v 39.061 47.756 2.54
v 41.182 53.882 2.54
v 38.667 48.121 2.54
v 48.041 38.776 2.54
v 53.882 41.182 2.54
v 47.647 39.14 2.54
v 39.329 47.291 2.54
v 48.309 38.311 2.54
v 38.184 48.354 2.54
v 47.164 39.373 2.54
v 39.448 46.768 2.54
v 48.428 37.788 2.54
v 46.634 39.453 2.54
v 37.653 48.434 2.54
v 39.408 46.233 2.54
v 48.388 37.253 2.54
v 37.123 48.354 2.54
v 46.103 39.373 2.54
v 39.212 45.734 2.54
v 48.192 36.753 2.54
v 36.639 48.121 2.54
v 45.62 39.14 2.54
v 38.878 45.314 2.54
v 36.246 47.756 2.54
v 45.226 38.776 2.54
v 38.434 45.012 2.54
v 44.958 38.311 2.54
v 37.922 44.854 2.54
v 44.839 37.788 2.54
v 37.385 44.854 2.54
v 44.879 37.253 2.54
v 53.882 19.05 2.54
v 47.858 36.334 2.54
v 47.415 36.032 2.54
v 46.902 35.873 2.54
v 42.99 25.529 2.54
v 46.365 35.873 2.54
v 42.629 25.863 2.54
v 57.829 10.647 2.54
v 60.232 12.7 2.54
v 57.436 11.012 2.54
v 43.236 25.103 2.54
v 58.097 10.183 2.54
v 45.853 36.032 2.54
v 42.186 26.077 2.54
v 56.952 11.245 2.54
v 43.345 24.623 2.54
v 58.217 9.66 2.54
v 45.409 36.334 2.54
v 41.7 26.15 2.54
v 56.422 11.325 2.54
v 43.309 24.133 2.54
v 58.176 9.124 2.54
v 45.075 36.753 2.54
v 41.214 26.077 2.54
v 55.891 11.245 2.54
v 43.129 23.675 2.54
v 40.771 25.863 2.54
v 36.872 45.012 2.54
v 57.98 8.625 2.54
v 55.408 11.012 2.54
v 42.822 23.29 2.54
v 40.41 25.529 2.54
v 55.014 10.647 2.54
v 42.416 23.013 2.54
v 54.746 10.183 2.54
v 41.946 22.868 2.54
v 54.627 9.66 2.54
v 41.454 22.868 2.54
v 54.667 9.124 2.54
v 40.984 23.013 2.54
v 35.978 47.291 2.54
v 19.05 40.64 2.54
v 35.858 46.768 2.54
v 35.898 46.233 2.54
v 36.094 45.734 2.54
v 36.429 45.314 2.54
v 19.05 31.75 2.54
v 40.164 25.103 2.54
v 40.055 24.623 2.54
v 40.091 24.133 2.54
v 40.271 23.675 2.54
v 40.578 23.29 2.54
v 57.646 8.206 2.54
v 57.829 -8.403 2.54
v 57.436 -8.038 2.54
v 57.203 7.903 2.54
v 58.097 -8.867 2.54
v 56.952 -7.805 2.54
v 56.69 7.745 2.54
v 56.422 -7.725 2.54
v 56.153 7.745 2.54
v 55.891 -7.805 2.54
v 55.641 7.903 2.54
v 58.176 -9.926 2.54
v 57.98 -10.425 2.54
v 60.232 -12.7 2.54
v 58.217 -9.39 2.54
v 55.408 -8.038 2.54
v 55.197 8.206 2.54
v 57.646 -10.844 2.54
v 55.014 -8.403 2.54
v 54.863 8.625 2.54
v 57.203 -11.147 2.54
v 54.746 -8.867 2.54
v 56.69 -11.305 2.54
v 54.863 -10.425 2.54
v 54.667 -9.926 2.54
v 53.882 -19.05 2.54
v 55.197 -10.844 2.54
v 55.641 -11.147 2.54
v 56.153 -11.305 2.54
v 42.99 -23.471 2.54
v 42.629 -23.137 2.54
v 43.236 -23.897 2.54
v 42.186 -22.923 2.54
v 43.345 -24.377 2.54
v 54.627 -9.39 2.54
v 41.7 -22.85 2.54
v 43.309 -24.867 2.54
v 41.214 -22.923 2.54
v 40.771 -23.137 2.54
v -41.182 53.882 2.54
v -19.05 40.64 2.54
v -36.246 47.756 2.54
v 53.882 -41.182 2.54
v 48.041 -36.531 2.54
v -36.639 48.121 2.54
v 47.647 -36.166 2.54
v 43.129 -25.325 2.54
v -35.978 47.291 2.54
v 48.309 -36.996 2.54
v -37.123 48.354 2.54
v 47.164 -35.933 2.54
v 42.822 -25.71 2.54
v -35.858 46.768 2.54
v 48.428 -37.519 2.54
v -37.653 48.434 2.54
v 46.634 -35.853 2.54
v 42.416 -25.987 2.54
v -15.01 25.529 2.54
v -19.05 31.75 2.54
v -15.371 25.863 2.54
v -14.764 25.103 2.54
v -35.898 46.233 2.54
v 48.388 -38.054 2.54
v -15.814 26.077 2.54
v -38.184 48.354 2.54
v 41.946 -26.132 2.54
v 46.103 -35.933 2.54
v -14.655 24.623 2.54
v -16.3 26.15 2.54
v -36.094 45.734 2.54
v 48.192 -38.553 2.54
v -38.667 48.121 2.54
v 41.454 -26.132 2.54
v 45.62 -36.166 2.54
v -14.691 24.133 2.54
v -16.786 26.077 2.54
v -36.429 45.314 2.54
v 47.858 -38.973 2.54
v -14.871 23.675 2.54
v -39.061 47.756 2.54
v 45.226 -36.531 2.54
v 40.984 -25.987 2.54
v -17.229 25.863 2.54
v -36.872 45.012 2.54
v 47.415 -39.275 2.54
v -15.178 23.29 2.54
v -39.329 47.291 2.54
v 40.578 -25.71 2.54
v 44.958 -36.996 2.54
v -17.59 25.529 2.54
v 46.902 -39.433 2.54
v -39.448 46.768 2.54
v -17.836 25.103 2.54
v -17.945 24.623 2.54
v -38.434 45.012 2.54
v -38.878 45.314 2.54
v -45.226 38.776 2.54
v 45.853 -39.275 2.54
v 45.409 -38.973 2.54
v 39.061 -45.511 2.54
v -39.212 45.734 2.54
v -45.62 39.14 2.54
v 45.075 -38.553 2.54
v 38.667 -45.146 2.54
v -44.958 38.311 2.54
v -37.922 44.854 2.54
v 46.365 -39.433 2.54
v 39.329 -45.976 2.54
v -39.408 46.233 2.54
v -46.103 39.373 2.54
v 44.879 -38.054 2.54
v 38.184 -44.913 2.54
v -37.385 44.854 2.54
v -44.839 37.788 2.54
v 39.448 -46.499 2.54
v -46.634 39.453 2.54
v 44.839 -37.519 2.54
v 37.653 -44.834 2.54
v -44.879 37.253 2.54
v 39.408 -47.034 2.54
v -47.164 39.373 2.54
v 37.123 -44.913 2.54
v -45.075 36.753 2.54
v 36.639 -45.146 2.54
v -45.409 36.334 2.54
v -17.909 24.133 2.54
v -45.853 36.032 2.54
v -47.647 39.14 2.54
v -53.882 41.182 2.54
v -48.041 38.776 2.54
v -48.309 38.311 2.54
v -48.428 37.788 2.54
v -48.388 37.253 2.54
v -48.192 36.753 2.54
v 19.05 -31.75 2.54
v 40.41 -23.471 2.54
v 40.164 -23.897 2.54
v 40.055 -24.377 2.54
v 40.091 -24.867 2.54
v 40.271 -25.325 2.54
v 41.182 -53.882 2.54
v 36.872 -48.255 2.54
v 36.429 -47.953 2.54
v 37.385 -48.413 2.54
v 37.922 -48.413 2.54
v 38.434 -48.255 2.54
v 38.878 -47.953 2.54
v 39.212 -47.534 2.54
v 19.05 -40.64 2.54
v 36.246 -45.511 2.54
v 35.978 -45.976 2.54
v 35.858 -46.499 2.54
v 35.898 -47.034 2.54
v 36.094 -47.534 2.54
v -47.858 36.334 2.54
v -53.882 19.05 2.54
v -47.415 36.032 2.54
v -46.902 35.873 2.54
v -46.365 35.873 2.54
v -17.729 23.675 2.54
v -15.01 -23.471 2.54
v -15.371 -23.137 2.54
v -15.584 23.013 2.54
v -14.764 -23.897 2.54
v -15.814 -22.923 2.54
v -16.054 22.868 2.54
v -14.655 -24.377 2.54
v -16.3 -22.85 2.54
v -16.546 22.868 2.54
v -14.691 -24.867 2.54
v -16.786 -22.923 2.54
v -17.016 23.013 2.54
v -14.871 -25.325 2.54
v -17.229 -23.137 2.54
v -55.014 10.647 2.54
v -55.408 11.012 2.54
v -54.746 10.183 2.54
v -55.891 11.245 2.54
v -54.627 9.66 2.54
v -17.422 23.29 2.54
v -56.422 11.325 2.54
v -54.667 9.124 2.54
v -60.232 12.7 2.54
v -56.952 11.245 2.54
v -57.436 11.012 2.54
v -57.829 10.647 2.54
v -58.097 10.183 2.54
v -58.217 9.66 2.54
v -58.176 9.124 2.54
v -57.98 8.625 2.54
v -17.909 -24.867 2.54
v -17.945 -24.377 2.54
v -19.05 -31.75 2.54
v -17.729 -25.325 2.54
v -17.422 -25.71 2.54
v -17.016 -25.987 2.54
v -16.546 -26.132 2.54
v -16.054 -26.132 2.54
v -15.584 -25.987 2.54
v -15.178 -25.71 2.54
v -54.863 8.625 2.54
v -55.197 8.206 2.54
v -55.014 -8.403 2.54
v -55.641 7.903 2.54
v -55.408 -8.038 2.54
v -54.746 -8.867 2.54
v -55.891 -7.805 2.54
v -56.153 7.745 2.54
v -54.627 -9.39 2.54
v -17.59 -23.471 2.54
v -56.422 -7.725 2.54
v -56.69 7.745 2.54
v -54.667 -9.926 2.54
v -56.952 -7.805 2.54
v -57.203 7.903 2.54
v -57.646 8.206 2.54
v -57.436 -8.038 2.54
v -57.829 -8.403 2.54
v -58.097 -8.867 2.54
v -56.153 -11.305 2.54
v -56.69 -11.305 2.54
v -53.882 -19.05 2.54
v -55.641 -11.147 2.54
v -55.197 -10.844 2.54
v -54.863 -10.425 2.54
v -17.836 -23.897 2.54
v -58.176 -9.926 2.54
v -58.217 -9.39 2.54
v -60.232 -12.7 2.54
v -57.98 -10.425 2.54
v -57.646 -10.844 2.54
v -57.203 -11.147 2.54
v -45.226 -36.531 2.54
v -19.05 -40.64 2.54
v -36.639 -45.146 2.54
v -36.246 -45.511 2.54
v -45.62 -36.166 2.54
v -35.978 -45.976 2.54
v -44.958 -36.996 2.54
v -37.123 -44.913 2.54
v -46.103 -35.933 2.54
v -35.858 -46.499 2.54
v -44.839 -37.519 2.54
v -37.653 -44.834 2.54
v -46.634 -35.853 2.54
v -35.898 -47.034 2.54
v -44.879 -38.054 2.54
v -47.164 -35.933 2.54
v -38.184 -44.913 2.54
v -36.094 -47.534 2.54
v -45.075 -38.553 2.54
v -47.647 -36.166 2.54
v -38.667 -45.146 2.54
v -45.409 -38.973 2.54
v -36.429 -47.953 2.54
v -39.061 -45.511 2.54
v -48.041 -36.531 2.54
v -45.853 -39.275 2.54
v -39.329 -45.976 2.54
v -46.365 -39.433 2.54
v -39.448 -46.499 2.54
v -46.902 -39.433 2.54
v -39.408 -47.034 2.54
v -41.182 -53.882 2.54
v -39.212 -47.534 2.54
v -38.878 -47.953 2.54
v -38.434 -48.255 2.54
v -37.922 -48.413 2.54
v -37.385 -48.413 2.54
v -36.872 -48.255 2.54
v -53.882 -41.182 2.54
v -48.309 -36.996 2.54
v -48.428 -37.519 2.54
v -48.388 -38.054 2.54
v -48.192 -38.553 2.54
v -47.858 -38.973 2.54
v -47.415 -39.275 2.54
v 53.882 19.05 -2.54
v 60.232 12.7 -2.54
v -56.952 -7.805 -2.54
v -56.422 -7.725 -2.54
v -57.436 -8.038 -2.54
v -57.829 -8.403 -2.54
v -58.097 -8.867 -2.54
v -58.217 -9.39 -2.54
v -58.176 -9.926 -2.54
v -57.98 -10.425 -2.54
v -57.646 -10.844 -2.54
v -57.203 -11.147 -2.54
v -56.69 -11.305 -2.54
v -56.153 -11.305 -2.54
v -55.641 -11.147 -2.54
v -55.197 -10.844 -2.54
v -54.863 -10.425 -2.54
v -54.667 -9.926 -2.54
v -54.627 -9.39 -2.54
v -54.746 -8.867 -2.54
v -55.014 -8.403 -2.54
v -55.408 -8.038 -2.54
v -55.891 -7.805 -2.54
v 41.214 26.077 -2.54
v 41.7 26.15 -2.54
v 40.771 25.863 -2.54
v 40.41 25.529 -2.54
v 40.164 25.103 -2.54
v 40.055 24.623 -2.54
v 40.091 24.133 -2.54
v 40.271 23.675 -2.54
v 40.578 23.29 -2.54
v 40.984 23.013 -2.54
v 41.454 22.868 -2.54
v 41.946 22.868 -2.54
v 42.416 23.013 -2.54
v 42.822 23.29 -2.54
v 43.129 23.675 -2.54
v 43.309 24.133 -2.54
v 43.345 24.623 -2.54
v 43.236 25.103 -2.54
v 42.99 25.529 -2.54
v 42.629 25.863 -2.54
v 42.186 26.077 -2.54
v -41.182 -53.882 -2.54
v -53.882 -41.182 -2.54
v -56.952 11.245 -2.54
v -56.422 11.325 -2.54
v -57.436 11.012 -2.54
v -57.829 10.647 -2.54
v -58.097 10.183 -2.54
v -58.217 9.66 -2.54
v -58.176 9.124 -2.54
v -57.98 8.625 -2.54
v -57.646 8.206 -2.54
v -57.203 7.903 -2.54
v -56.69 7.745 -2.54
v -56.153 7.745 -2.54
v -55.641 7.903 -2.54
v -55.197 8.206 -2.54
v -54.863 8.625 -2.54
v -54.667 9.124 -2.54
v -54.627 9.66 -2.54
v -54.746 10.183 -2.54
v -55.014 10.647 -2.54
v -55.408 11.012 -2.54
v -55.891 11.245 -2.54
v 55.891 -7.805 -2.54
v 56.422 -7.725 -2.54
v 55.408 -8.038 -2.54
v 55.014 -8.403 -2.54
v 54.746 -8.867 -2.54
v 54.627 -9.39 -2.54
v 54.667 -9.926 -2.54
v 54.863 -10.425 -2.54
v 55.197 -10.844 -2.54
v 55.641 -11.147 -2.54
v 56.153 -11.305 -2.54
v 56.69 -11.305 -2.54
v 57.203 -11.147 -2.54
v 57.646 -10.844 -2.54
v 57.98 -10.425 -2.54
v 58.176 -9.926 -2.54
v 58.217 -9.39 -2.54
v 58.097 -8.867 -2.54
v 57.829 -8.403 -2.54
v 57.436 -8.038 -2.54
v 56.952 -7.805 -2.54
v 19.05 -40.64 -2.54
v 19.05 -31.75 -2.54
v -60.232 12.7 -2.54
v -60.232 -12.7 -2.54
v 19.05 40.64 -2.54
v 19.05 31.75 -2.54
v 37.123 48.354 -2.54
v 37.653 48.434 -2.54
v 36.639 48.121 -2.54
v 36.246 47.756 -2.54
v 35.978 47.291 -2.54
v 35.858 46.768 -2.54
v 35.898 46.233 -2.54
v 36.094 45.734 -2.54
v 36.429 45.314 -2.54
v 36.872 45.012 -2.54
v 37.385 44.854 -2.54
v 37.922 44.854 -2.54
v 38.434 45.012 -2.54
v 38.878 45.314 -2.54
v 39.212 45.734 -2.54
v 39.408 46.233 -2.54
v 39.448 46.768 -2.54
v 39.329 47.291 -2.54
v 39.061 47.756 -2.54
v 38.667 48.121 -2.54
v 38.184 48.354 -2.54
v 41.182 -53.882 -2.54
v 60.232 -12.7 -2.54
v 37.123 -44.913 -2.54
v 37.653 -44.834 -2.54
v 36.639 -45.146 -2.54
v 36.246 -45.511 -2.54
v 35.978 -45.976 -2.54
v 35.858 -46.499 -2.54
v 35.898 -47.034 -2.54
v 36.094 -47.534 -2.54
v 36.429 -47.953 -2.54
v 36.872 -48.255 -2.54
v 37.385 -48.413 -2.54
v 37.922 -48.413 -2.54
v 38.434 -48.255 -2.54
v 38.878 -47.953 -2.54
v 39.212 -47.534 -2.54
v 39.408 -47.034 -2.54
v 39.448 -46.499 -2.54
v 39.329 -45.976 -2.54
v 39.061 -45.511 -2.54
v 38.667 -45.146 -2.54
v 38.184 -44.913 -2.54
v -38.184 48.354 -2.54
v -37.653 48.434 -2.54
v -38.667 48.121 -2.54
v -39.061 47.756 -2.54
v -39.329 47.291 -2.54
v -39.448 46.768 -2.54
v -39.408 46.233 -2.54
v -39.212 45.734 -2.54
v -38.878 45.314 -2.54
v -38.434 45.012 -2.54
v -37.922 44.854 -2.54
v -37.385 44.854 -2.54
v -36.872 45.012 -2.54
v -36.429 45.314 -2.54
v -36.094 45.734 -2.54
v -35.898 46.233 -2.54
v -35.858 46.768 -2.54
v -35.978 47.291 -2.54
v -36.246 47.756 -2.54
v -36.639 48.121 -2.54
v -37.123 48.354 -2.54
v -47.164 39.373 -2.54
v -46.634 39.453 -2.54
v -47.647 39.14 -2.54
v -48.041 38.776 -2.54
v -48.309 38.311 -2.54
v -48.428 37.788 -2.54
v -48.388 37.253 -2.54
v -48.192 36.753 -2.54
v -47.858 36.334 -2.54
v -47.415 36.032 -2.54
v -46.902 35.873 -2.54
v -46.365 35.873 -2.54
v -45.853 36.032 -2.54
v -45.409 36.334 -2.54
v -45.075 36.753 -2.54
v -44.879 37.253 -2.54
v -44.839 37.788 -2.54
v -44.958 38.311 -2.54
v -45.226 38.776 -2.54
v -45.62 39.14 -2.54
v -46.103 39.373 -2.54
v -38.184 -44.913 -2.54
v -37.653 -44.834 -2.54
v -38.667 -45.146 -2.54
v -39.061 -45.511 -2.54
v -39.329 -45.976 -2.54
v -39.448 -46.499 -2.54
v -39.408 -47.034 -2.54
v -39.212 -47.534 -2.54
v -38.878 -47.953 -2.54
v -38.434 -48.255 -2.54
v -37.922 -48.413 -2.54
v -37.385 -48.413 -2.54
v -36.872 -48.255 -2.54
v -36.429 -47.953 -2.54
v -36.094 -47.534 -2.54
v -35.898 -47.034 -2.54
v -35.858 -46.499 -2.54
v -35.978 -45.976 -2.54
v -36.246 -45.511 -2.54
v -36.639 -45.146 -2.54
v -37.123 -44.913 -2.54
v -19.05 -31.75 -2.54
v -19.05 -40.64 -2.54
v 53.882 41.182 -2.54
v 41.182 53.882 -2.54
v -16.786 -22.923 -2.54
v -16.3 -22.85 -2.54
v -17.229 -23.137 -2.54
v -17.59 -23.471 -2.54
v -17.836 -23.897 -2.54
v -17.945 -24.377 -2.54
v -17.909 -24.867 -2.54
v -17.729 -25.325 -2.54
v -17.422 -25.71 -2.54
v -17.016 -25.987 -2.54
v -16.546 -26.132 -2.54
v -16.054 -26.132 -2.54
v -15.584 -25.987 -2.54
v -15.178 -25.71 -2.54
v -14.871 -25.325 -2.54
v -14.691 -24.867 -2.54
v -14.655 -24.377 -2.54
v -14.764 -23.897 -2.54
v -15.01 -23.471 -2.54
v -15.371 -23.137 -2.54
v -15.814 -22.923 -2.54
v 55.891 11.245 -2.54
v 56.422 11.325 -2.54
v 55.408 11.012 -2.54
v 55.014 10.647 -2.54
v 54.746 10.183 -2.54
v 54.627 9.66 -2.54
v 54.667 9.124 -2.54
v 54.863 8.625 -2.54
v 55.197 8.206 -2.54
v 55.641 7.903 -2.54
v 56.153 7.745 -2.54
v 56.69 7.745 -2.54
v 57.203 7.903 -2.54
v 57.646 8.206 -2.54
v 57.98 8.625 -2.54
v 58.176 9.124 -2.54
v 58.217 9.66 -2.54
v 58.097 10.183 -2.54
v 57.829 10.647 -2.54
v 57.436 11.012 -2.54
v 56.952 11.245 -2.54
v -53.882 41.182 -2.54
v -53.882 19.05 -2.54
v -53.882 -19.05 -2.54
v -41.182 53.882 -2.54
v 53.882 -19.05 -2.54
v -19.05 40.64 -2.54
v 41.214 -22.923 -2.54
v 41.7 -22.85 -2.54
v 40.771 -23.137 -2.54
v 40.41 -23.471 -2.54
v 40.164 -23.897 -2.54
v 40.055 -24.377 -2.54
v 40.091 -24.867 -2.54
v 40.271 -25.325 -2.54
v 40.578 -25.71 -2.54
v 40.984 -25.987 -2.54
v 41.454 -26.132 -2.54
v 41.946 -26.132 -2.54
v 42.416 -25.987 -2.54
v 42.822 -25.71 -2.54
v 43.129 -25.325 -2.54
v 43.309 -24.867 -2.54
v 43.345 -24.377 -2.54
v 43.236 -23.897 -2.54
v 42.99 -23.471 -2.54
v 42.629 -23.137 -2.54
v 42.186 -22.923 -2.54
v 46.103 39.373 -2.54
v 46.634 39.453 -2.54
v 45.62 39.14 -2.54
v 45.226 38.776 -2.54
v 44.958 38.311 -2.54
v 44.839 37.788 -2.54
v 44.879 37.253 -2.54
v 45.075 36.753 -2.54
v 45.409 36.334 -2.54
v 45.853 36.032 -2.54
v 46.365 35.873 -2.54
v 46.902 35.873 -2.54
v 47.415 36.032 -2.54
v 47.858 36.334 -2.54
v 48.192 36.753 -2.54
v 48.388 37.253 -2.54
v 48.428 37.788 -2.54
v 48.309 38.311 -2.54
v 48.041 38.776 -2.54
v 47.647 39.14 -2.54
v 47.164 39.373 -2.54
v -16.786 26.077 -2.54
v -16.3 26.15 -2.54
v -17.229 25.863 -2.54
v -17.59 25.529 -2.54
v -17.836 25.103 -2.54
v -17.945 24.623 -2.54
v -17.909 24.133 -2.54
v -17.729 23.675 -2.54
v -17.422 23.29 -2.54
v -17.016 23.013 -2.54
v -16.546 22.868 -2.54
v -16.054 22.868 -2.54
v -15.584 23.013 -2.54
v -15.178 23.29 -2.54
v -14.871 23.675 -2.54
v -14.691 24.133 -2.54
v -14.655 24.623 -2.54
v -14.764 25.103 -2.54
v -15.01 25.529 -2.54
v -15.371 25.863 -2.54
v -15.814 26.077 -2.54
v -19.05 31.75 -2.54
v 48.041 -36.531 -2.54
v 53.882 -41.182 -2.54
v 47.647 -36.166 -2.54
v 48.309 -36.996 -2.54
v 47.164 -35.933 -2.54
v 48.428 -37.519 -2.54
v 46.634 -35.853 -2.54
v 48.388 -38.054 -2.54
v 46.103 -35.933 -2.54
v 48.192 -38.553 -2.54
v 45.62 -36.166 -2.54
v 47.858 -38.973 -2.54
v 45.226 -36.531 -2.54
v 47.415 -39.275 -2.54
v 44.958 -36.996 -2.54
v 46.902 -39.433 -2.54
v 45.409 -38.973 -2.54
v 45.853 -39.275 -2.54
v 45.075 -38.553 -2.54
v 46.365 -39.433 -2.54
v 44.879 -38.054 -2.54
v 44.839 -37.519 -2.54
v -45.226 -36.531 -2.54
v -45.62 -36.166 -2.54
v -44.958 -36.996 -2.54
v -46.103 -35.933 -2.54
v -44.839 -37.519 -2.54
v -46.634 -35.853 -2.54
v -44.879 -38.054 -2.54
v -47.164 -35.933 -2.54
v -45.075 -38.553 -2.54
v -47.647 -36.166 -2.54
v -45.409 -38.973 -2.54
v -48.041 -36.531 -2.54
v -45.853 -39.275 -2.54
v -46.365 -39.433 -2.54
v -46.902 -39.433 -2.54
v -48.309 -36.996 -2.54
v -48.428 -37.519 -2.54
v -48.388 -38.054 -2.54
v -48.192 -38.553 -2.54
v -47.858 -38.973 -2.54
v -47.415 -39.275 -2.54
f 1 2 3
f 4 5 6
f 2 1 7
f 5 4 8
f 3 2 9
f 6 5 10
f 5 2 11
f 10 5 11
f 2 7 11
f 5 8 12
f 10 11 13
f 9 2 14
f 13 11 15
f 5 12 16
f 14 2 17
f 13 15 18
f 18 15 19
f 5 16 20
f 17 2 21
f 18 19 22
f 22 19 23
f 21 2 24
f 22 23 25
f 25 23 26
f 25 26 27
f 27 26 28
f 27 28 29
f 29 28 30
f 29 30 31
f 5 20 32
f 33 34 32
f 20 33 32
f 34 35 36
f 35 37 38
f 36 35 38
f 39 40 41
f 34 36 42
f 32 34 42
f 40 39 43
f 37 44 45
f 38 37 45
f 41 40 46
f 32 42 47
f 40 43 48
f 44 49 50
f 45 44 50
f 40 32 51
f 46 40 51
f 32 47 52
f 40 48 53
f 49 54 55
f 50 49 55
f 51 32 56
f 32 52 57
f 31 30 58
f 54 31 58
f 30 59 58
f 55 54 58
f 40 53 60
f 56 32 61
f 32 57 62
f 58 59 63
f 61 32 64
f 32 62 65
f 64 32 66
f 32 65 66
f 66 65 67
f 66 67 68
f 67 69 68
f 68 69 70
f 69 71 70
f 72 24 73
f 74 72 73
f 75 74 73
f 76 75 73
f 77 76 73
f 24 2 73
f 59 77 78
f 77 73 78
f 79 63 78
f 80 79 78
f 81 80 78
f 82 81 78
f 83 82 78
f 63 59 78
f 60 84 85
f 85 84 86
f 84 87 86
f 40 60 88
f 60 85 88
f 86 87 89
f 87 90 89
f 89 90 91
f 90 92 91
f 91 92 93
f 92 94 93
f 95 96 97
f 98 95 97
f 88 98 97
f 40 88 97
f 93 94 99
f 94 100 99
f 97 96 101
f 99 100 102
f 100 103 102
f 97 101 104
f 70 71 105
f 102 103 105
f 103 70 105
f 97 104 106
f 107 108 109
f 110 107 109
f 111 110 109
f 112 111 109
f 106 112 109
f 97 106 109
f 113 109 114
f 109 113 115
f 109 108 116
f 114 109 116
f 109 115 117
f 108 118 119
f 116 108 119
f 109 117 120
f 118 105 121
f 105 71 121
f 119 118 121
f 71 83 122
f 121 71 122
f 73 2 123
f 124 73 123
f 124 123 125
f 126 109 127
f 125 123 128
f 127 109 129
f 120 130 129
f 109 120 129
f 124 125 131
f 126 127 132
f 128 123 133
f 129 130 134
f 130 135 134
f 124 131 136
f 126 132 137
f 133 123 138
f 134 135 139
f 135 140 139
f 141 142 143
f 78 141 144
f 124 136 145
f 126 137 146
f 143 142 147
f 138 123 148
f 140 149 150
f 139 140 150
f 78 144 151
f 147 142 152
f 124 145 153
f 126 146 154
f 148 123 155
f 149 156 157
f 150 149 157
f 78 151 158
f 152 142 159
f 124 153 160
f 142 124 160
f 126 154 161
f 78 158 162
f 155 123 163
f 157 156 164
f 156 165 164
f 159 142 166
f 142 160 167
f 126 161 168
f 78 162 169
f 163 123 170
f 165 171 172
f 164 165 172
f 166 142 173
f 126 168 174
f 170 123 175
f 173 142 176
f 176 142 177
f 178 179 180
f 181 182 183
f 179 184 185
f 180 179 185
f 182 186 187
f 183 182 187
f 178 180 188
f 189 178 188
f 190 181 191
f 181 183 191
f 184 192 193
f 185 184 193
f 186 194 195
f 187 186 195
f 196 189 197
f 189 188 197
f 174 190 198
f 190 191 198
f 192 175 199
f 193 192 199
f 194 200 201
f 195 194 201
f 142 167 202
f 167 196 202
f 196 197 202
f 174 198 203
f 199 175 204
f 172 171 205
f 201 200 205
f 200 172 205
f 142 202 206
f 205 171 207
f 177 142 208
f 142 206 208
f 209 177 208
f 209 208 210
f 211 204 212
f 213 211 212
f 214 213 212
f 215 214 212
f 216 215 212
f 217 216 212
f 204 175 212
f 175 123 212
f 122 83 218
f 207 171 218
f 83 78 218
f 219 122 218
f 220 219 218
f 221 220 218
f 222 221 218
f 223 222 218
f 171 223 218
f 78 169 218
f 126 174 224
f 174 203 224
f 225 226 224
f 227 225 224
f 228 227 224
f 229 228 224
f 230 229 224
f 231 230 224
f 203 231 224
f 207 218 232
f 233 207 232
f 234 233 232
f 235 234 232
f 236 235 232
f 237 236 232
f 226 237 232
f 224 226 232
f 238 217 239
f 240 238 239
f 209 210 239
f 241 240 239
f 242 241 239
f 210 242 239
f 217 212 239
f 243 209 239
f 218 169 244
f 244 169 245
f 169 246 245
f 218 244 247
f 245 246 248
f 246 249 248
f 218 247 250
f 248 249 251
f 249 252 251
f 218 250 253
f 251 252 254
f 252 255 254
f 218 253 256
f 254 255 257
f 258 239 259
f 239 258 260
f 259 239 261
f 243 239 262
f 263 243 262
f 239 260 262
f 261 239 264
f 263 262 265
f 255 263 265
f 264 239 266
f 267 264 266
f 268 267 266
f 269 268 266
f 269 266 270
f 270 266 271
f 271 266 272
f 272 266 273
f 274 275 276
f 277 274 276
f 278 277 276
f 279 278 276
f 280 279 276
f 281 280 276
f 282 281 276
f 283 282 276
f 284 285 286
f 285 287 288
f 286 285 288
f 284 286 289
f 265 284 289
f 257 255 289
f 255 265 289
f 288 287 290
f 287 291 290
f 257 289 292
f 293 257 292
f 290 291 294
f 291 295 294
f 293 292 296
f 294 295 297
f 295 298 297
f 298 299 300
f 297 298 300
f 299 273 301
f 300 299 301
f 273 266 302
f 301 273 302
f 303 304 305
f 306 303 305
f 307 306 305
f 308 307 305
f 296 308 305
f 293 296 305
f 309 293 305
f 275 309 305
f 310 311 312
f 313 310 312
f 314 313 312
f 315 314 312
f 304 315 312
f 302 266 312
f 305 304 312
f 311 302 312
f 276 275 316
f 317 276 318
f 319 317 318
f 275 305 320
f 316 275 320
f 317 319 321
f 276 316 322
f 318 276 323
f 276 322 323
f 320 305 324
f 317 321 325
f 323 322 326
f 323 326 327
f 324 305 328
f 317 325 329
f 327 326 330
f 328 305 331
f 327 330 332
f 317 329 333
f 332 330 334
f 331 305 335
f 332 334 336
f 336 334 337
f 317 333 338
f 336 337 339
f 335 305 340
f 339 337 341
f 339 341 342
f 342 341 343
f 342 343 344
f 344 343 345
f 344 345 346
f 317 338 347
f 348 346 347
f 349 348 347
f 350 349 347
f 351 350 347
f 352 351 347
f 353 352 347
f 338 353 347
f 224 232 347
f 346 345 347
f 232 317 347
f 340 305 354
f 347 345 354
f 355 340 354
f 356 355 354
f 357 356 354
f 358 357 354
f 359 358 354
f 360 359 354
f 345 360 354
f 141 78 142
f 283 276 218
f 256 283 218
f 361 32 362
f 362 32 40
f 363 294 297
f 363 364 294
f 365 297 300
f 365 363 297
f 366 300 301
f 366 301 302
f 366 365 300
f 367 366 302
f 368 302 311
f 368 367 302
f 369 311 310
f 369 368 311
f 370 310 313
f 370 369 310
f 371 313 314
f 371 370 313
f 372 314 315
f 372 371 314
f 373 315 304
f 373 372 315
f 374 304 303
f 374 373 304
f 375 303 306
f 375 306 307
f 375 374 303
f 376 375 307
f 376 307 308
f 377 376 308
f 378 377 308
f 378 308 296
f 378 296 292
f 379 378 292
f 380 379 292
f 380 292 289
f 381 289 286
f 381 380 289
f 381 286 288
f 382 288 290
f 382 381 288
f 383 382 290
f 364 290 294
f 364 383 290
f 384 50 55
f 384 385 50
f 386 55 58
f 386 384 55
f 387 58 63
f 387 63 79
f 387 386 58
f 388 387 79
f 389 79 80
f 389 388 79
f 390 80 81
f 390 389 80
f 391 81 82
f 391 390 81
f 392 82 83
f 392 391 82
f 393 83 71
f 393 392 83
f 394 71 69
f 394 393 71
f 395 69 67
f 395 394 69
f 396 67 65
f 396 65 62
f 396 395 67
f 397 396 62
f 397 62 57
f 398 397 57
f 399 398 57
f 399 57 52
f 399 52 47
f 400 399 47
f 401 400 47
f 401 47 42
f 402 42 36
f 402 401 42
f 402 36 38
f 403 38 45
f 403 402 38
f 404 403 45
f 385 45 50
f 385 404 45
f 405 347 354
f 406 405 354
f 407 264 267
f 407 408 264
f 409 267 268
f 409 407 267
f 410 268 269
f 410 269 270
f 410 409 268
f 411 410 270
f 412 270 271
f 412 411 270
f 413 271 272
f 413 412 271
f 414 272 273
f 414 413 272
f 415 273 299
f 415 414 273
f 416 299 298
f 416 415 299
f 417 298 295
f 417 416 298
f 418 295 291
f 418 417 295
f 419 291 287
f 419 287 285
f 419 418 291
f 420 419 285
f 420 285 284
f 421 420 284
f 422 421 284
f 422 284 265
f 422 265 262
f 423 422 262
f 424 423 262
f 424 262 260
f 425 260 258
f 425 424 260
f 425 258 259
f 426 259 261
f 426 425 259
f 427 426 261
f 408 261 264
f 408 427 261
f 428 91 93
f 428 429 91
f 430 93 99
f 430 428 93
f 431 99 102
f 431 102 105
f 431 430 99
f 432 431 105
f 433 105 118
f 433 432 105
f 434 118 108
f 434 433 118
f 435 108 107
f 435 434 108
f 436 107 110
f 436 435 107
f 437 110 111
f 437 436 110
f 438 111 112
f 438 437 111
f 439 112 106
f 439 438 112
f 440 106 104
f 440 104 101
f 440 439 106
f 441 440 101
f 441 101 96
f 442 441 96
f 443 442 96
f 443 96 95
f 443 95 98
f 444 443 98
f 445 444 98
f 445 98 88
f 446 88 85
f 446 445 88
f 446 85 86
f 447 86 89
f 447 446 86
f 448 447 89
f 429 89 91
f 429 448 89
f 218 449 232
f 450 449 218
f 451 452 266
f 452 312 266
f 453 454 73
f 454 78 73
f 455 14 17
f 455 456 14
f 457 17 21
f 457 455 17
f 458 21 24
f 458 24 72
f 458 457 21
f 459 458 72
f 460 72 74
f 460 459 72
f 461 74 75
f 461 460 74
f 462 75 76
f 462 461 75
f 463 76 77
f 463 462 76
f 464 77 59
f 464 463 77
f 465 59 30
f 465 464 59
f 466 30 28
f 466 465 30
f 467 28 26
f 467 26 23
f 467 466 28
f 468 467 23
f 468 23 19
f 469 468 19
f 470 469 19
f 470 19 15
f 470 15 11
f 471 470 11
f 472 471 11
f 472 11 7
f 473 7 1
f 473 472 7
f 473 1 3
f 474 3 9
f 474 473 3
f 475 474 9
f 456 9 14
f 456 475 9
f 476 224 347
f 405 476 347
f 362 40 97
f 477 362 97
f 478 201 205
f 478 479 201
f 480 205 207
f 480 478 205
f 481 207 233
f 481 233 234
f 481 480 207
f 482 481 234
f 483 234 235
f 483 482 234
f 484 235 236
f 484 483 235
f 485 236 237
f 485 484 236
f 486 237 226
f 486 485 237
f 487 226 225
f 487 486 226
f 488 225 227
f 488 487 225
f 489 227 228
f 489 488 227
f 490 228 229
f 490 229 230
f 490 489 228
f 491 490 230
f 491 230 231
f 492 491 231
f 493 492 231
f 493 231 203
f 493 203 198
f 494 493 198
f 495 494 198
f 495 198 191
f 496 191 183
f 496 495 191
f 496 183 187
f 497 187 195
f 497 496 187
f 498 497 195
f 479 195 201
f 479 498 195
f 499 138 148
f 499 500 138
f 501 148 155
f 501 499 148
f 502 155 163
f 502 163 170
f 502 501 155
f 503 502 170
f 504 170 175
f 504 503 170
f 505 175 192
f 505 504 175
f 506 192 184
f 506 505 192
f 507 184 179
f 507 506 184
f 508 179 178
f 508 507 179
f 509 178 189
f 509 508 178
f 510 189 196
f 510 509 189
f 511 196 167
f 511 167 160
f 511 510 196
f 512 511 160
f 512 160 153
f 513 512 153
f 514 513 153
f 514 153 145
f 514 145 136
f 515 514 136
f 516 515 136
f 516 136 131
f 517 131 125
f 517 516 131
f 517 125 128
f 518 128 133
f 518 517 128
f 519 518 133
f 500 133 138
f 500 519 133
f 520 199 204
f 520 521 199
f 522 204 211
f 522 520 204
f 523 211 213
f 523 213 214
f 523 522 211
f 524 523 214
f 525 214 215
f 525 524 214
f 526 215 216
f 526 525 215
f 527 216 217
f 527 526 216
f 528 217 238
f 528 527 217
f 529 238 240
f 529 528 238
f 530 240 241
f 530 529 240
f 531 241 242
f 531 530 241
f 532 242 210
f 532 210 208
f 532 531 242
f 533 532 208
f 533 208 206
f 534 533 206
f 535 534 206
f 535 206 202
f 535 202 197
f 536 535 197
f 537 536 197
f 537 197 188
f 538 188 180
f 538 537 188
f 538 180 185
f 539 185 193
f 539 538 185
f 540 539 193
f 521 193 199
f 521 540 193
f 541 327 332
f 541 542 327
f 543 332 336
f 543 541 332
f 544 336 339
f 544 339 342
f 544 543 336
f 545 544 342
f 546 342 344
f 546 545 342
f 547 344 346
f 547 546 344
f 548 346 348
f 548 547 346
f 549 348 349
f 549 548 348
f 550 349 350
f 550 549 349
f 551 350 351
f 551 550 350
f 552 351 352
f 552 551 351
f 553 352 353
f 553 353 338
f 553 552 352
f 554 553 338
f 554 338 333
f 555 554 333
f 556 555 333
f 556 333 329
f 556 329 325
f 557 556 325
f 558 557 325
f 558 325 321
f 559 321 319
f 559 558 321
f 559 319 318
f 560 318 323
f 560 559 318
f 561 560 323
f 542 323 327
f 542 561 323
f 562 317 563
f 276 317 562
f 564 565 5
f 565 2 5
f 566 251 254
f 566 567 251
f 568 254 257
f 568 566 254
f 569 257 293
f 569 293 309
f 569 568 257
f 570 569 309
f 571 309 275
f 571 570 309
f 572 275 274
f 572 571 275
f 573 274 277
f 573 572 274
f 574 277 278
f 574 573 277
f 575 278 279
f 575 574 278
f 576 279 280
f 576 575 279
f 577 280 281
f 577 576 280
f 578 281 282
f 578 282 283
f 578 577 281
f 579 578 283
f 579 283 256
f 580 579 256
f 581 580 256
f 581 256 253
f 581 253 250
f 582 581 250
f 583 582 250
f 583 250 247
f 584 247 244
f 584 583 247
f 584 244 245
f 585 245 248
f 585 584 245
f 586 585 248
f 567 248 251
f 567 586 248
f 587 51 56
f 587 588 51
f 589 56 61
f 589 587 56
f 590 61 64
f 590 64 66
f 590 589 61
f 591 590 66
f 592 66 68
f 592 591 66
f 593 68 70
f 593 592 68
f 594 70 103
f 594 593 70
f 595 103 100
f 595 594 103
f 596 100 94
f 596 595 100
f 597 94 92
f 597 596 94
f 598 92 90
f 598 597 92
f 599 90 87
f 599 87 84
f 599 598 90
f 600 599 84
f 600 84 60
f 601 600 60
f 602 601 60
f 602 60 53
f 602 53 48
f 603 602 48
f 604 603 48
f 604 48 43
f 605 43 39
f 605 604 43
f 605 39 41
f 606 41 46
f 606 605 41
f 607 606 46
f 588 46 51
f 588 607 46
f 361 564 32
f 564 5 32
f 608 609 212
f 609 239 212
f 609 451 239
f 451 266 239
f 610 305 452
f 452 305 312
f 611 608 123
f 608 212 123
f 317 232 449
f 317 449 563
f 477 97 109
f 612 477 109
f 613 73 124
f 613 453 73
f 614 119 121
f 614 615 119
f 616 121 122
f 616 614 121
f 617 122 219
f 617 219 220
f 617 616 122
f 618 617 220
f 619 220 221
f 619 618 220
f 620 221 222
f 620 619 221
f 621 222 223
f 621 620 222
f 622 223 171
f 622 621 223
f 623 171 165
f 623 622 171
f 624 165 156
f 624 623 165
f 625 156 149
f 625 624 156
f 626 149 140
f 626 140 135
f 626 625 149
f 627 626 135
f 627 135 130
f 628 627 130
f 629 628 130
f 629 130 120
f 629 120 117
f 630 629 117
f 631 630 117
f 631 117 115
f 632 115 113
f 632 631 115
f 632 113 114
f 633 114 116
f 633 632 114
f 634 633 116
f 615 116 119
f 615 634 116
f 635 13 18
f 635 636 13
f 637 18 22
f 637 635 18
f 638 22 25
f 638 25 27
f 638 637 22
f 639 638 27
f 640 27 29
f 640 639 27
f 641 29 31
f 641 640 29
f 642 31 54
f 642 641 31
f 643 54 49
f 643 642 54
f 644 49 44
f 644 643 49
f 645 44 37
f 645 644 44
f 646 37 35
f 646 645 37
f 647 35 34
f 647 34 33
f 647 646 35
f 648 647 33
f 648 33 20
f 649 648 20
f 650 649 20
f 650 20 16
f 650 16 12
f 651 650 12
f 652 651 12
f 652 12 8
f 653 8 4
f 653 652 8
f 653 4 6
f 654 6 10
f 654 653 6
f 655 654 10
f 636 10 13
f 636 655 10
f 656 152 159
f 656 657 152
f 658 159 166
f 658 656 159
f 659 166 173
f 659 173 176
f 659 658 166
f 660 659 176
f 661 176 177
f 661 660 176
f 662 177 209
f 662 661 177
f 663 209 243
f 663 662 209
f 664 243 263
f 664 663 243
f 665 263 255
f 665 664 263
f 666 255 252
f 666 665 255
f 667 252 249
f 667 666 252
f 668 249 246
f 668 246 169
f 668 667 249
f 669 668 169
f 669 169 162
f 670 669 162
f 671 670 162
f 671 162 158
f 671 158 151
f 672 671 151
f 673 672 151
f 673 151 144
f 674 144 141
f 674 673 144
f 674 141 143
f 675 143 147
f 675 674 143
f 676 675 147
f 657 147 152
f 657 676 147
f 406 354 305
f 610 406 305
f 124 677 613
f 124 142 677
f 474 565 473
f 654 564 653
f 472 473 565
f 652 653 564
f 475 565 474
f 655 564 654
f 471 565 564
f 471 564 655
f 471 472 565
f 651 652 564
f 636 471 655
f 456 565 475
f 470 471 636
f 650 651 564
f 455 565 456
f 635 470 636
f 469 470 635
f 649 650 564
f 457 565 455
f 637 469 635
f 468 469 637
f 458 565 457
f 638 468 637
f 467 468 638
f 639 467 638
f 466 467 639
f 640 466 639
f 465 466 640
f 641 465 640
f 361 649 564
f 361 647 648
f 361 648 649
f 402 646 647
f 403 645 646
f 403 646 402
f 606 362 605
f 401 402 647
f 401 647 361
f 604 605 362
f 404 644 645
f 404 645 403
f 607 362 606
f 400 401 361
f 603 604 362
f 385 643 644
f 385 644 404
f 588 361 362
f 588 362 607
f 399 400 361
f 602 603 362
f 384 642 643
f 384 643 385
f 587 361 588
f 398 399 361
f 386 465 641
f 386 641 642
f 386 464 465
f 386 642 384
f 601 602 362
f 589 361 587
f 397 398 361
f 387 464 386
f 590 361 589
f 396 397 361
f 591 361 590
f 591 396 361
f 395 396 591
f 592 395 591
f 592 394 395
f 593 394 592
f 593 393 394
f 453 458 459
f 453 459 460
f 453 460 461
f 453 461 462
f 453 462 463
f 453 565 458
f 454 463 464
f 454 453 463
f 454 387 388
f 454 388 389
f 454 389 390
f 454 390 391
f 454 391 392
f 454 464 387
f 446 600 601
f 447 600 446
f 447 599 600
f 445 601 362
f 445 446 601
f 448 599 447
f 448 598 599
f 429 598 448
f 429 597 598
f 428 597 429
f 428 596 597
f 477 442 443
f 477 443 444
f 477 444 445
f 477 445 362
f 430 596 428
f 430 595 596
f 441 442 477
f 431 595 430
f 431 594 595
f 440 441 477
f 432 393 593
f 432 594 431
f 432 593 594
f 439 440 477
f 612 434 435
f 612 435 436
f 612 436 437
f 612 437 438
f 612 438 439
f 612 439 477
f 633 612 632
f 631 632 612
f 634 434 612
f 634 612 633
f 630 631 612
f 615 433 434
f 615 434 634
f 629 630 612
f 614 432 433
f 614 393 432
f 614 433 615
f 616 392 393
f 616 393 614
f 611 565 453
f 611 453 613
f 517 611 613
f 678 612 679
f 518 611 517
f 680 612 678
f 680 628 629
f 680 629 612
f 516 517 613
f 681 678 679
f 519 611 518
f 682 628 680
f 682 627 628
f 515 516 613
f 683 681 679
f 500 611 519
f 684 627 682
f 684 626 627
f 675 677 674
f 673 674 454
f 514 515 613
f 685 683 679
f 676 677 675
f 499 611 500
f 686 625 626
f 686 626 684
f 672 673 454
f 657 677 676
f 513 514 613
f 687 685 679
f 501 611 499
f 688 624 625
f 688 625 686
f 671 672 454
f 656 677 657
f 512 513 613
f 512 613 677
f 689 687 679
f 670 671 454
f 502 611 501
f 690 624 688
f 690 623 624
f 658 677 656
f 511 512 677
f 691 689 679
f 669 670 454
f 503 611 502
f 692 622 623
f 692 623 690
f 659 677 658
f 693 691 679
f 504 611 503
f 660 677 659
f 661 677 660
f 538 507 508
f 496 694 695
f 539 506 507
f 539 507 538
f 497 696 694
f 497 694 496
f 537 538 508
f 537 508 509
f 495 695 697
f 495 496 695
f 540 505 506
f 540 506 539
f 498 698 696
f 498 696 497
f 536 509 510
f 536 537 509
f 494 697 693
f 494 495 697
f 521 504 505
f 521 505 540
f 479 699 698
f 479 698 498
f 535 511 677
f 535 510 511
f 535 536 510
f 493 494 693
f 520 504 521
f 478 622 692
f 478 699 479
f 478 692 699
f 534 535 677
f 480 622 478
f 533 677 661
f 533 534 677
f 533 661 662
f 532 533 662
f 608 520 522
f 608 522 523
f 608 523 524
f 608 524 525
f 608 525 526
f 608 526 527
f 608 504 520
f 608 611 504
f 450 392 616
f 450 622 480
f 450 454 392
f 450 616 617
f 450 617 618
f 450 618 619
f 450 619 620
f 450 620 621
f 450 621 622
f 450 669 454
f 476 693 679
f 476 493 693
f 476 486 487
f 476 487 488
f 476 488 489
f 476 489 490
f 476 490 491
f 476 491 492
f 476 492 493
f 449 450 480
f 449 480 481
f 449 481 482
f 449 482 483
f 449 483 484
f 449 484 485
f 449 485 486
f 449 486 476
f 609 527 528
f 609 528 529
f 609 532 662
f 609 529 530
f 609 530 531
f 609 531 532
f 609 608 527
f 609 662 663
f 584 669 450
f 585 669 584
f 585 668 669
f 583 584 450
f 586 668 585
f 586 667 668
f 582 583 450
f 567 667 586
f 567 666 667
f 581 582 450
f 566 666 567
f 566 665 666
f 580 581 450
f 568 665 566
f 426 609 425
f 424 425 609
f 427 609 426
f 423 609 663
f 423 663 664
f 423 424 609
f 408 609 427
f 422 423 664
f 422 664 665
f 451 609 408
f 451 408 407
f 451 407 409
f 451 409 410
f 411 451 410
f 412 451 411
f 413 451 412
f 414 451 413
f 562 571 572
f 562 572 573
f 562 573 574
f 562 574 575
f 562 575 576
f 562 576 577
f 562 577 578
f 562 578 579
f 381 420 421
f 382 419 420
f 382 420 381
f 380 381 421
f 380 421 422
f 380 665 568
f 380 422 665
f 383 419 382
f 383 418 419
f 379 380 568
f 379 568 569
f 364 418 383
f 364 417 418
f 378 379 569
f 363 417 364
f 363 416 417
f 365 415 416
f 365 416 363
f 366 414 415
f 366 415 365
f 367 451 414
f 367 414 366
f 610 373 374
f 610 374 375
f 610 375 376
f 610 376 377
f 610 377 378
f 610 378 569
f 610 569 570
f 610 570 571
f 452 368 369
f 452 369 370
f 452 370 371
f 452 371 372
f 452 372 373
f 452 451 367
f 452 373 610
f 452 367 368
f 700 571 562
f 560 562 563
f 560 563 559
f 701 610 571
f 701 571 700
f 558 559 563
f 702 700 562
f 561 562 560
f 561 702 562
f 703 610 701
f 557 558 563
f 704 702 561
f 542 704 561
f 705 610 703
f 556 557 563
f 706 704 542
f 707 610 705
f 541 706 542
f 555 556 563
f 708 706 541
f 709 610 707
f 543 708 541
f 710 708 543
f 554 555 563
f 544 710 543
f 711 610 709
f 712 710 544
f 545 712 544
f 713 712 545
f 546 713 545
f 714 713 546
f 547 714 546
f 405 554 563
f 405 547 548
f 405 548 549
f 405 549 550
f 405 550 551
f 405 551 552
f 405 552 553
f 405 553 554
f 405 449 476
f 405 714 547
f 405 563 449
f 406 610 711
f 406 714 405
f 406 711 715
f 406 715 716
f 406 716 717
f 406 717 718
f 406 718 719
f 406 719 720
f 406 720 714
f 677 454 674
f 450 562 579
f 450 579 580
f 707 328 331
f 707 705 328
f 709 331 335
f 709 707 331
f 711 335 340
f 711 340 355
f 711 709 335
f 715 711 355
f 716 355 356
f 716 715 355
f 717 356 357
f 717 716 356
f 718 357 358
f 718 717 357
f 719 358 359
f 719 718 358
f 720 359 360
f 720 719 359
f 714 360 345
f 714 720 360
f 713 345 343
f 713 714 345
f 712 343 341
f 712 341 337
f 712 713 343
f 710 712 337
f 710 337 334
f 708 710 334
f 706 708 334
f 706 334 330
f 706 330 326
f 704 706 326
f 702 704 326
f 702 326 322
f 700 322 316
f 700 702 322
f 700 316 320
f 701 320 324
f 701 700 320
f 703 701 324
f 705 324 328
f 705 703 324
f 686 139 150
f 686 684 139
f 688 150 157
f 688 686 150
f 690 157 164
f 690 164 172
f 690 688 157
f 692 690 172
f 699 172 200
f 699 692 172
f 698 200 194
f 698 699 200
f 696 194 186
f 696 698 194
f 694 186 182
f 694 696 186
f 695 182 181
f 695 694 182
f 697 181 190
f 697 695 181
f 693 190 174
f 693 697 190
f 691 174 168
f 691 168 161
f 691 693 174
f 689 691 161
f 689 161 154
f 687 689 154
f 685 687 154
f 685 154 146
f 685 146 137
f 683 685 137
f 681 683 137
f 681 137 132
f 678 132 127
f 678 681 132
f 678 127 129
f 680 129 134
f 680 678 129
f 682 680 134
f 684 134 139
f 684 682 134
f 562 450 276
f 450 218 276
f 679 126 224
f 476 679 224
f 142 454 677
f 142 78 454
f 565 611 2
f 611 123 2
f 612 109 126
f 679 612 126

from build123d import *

# Parameters (mm, degrees)
SKETCH1_R           = 1.800000083
SKETCH1_R_2         = 1.650000002
SKETCH1_W           = 8.89
SKETCH1_H           = 38.1
BOSS_EXTRUDE1_DEPTH = 2.54


with BuildPart() as part:
    # Sketch1 → Boss-Extrude1 (new body, symmetric)
    with BuildSketch(Plane(origin=(0, 0, 0), x_dir=(0, 1, 0), z_dir=(0, 0, 1))):
        Polygon((-41.181536726, 53.881536726), (-19.05, 53.881536726), (-12.7, 60.231536726), (12.7, 60.231536726), (19.05, 53.881536726), (41.181536726, 53.881536726), (53.881536726, 41.181536726), (53.881536726, -41.181536726), (41.181536726, -53.881536726), (19.05, -53.881536726), (12.7, -60.231536726), (-12.7, -60.231536726), (-19.05, -53.881536726), (-41.181536726, -53.881536726), (-53.881536726, -41.181536726), (-53.881536726, 41.181536726), align=None)
        with Locations((-46.633511114, -37.653254993)):
            Circle(SKETCH1_R, mode=Mode.SUBTRACT)
        with Locations((-37.653254993, -46.633511114)):
            Circle(SKETCH1_R, mode=Mode.SUBTRACT)
        with Locations((46.633511114, -37.653254993)):
            Circle(SKETCH1_R, mode=Mode.SUBTRACT)
        with Locations((37.653254993, -46.633511114)):
            Circle(SKETCH1_R, mode=Mode.SUBTRACT)
        with Locations((-46.633511114, 37.653254993)):
            Circle(SKETCH1_R, mode=Mode.SUBTRACT)
        with Locations((-37.653254993, 46.633511114)):
            Circle(SKETCH1_R, mode=Mode.SUBTRACT)
        with Locations((37.653254993, 46.633511114)):
            Circle(SKETCH1_R, mode=Mode.SUBTRACT)
        with Locations((46.633511114, 37.653254993)):
            Circle(SKETCH1_R, mode=Mode.SUBTRACT)
        with Locations((-24.5, -41.7)):
            Circle(SKETCH1_R_2, mode=Mode.SUBTRACT)
        with Locations((24.5, -41.7)):
            Circle(SKETCH1_R_2, mode=Mode.SUBTRACT)
        with Locations((24.5, 16.3)):
            Circle(SKETCH1_R_2, mode=Mode.SUBTRACT)
        with Locations((-24.5, 16.3)):
            Circle(SKETCH1_R_2, mode=Mode.SUBTRACT)
        with Locations((-9.525, -56.421536726)):
            Circle(SKETCH1_R, mode=Mode.SUBTRACT)
        with Locations((9.525, -56.421536726)):
            Circle(SKETCH1_R, mode=Mode.SUBTRACT)
        with Locations((9.525, 56.421536726)):
            Circle(SKETCH1_R, mode=Mode.SUBTRACT)
        with Locations((-9.525, 56.421536726)):
            Circle(SKETCH1_R, mode=Mode.SUBTRACT)
        with Locations((36.195, 0)):
            Rectangle(SKETCH1_W, SKETCH1_H, mode=Mode.SUBTRACT)
        with Locations((-36.195, 0)):
            Rectangle(SKETCH1_W, SKETCH1_H, mode=Mode.SUBTRACT)
    extrude(amount=BOSS_EXTRUDE1_DEPTH, both=True)


solid = part.part
